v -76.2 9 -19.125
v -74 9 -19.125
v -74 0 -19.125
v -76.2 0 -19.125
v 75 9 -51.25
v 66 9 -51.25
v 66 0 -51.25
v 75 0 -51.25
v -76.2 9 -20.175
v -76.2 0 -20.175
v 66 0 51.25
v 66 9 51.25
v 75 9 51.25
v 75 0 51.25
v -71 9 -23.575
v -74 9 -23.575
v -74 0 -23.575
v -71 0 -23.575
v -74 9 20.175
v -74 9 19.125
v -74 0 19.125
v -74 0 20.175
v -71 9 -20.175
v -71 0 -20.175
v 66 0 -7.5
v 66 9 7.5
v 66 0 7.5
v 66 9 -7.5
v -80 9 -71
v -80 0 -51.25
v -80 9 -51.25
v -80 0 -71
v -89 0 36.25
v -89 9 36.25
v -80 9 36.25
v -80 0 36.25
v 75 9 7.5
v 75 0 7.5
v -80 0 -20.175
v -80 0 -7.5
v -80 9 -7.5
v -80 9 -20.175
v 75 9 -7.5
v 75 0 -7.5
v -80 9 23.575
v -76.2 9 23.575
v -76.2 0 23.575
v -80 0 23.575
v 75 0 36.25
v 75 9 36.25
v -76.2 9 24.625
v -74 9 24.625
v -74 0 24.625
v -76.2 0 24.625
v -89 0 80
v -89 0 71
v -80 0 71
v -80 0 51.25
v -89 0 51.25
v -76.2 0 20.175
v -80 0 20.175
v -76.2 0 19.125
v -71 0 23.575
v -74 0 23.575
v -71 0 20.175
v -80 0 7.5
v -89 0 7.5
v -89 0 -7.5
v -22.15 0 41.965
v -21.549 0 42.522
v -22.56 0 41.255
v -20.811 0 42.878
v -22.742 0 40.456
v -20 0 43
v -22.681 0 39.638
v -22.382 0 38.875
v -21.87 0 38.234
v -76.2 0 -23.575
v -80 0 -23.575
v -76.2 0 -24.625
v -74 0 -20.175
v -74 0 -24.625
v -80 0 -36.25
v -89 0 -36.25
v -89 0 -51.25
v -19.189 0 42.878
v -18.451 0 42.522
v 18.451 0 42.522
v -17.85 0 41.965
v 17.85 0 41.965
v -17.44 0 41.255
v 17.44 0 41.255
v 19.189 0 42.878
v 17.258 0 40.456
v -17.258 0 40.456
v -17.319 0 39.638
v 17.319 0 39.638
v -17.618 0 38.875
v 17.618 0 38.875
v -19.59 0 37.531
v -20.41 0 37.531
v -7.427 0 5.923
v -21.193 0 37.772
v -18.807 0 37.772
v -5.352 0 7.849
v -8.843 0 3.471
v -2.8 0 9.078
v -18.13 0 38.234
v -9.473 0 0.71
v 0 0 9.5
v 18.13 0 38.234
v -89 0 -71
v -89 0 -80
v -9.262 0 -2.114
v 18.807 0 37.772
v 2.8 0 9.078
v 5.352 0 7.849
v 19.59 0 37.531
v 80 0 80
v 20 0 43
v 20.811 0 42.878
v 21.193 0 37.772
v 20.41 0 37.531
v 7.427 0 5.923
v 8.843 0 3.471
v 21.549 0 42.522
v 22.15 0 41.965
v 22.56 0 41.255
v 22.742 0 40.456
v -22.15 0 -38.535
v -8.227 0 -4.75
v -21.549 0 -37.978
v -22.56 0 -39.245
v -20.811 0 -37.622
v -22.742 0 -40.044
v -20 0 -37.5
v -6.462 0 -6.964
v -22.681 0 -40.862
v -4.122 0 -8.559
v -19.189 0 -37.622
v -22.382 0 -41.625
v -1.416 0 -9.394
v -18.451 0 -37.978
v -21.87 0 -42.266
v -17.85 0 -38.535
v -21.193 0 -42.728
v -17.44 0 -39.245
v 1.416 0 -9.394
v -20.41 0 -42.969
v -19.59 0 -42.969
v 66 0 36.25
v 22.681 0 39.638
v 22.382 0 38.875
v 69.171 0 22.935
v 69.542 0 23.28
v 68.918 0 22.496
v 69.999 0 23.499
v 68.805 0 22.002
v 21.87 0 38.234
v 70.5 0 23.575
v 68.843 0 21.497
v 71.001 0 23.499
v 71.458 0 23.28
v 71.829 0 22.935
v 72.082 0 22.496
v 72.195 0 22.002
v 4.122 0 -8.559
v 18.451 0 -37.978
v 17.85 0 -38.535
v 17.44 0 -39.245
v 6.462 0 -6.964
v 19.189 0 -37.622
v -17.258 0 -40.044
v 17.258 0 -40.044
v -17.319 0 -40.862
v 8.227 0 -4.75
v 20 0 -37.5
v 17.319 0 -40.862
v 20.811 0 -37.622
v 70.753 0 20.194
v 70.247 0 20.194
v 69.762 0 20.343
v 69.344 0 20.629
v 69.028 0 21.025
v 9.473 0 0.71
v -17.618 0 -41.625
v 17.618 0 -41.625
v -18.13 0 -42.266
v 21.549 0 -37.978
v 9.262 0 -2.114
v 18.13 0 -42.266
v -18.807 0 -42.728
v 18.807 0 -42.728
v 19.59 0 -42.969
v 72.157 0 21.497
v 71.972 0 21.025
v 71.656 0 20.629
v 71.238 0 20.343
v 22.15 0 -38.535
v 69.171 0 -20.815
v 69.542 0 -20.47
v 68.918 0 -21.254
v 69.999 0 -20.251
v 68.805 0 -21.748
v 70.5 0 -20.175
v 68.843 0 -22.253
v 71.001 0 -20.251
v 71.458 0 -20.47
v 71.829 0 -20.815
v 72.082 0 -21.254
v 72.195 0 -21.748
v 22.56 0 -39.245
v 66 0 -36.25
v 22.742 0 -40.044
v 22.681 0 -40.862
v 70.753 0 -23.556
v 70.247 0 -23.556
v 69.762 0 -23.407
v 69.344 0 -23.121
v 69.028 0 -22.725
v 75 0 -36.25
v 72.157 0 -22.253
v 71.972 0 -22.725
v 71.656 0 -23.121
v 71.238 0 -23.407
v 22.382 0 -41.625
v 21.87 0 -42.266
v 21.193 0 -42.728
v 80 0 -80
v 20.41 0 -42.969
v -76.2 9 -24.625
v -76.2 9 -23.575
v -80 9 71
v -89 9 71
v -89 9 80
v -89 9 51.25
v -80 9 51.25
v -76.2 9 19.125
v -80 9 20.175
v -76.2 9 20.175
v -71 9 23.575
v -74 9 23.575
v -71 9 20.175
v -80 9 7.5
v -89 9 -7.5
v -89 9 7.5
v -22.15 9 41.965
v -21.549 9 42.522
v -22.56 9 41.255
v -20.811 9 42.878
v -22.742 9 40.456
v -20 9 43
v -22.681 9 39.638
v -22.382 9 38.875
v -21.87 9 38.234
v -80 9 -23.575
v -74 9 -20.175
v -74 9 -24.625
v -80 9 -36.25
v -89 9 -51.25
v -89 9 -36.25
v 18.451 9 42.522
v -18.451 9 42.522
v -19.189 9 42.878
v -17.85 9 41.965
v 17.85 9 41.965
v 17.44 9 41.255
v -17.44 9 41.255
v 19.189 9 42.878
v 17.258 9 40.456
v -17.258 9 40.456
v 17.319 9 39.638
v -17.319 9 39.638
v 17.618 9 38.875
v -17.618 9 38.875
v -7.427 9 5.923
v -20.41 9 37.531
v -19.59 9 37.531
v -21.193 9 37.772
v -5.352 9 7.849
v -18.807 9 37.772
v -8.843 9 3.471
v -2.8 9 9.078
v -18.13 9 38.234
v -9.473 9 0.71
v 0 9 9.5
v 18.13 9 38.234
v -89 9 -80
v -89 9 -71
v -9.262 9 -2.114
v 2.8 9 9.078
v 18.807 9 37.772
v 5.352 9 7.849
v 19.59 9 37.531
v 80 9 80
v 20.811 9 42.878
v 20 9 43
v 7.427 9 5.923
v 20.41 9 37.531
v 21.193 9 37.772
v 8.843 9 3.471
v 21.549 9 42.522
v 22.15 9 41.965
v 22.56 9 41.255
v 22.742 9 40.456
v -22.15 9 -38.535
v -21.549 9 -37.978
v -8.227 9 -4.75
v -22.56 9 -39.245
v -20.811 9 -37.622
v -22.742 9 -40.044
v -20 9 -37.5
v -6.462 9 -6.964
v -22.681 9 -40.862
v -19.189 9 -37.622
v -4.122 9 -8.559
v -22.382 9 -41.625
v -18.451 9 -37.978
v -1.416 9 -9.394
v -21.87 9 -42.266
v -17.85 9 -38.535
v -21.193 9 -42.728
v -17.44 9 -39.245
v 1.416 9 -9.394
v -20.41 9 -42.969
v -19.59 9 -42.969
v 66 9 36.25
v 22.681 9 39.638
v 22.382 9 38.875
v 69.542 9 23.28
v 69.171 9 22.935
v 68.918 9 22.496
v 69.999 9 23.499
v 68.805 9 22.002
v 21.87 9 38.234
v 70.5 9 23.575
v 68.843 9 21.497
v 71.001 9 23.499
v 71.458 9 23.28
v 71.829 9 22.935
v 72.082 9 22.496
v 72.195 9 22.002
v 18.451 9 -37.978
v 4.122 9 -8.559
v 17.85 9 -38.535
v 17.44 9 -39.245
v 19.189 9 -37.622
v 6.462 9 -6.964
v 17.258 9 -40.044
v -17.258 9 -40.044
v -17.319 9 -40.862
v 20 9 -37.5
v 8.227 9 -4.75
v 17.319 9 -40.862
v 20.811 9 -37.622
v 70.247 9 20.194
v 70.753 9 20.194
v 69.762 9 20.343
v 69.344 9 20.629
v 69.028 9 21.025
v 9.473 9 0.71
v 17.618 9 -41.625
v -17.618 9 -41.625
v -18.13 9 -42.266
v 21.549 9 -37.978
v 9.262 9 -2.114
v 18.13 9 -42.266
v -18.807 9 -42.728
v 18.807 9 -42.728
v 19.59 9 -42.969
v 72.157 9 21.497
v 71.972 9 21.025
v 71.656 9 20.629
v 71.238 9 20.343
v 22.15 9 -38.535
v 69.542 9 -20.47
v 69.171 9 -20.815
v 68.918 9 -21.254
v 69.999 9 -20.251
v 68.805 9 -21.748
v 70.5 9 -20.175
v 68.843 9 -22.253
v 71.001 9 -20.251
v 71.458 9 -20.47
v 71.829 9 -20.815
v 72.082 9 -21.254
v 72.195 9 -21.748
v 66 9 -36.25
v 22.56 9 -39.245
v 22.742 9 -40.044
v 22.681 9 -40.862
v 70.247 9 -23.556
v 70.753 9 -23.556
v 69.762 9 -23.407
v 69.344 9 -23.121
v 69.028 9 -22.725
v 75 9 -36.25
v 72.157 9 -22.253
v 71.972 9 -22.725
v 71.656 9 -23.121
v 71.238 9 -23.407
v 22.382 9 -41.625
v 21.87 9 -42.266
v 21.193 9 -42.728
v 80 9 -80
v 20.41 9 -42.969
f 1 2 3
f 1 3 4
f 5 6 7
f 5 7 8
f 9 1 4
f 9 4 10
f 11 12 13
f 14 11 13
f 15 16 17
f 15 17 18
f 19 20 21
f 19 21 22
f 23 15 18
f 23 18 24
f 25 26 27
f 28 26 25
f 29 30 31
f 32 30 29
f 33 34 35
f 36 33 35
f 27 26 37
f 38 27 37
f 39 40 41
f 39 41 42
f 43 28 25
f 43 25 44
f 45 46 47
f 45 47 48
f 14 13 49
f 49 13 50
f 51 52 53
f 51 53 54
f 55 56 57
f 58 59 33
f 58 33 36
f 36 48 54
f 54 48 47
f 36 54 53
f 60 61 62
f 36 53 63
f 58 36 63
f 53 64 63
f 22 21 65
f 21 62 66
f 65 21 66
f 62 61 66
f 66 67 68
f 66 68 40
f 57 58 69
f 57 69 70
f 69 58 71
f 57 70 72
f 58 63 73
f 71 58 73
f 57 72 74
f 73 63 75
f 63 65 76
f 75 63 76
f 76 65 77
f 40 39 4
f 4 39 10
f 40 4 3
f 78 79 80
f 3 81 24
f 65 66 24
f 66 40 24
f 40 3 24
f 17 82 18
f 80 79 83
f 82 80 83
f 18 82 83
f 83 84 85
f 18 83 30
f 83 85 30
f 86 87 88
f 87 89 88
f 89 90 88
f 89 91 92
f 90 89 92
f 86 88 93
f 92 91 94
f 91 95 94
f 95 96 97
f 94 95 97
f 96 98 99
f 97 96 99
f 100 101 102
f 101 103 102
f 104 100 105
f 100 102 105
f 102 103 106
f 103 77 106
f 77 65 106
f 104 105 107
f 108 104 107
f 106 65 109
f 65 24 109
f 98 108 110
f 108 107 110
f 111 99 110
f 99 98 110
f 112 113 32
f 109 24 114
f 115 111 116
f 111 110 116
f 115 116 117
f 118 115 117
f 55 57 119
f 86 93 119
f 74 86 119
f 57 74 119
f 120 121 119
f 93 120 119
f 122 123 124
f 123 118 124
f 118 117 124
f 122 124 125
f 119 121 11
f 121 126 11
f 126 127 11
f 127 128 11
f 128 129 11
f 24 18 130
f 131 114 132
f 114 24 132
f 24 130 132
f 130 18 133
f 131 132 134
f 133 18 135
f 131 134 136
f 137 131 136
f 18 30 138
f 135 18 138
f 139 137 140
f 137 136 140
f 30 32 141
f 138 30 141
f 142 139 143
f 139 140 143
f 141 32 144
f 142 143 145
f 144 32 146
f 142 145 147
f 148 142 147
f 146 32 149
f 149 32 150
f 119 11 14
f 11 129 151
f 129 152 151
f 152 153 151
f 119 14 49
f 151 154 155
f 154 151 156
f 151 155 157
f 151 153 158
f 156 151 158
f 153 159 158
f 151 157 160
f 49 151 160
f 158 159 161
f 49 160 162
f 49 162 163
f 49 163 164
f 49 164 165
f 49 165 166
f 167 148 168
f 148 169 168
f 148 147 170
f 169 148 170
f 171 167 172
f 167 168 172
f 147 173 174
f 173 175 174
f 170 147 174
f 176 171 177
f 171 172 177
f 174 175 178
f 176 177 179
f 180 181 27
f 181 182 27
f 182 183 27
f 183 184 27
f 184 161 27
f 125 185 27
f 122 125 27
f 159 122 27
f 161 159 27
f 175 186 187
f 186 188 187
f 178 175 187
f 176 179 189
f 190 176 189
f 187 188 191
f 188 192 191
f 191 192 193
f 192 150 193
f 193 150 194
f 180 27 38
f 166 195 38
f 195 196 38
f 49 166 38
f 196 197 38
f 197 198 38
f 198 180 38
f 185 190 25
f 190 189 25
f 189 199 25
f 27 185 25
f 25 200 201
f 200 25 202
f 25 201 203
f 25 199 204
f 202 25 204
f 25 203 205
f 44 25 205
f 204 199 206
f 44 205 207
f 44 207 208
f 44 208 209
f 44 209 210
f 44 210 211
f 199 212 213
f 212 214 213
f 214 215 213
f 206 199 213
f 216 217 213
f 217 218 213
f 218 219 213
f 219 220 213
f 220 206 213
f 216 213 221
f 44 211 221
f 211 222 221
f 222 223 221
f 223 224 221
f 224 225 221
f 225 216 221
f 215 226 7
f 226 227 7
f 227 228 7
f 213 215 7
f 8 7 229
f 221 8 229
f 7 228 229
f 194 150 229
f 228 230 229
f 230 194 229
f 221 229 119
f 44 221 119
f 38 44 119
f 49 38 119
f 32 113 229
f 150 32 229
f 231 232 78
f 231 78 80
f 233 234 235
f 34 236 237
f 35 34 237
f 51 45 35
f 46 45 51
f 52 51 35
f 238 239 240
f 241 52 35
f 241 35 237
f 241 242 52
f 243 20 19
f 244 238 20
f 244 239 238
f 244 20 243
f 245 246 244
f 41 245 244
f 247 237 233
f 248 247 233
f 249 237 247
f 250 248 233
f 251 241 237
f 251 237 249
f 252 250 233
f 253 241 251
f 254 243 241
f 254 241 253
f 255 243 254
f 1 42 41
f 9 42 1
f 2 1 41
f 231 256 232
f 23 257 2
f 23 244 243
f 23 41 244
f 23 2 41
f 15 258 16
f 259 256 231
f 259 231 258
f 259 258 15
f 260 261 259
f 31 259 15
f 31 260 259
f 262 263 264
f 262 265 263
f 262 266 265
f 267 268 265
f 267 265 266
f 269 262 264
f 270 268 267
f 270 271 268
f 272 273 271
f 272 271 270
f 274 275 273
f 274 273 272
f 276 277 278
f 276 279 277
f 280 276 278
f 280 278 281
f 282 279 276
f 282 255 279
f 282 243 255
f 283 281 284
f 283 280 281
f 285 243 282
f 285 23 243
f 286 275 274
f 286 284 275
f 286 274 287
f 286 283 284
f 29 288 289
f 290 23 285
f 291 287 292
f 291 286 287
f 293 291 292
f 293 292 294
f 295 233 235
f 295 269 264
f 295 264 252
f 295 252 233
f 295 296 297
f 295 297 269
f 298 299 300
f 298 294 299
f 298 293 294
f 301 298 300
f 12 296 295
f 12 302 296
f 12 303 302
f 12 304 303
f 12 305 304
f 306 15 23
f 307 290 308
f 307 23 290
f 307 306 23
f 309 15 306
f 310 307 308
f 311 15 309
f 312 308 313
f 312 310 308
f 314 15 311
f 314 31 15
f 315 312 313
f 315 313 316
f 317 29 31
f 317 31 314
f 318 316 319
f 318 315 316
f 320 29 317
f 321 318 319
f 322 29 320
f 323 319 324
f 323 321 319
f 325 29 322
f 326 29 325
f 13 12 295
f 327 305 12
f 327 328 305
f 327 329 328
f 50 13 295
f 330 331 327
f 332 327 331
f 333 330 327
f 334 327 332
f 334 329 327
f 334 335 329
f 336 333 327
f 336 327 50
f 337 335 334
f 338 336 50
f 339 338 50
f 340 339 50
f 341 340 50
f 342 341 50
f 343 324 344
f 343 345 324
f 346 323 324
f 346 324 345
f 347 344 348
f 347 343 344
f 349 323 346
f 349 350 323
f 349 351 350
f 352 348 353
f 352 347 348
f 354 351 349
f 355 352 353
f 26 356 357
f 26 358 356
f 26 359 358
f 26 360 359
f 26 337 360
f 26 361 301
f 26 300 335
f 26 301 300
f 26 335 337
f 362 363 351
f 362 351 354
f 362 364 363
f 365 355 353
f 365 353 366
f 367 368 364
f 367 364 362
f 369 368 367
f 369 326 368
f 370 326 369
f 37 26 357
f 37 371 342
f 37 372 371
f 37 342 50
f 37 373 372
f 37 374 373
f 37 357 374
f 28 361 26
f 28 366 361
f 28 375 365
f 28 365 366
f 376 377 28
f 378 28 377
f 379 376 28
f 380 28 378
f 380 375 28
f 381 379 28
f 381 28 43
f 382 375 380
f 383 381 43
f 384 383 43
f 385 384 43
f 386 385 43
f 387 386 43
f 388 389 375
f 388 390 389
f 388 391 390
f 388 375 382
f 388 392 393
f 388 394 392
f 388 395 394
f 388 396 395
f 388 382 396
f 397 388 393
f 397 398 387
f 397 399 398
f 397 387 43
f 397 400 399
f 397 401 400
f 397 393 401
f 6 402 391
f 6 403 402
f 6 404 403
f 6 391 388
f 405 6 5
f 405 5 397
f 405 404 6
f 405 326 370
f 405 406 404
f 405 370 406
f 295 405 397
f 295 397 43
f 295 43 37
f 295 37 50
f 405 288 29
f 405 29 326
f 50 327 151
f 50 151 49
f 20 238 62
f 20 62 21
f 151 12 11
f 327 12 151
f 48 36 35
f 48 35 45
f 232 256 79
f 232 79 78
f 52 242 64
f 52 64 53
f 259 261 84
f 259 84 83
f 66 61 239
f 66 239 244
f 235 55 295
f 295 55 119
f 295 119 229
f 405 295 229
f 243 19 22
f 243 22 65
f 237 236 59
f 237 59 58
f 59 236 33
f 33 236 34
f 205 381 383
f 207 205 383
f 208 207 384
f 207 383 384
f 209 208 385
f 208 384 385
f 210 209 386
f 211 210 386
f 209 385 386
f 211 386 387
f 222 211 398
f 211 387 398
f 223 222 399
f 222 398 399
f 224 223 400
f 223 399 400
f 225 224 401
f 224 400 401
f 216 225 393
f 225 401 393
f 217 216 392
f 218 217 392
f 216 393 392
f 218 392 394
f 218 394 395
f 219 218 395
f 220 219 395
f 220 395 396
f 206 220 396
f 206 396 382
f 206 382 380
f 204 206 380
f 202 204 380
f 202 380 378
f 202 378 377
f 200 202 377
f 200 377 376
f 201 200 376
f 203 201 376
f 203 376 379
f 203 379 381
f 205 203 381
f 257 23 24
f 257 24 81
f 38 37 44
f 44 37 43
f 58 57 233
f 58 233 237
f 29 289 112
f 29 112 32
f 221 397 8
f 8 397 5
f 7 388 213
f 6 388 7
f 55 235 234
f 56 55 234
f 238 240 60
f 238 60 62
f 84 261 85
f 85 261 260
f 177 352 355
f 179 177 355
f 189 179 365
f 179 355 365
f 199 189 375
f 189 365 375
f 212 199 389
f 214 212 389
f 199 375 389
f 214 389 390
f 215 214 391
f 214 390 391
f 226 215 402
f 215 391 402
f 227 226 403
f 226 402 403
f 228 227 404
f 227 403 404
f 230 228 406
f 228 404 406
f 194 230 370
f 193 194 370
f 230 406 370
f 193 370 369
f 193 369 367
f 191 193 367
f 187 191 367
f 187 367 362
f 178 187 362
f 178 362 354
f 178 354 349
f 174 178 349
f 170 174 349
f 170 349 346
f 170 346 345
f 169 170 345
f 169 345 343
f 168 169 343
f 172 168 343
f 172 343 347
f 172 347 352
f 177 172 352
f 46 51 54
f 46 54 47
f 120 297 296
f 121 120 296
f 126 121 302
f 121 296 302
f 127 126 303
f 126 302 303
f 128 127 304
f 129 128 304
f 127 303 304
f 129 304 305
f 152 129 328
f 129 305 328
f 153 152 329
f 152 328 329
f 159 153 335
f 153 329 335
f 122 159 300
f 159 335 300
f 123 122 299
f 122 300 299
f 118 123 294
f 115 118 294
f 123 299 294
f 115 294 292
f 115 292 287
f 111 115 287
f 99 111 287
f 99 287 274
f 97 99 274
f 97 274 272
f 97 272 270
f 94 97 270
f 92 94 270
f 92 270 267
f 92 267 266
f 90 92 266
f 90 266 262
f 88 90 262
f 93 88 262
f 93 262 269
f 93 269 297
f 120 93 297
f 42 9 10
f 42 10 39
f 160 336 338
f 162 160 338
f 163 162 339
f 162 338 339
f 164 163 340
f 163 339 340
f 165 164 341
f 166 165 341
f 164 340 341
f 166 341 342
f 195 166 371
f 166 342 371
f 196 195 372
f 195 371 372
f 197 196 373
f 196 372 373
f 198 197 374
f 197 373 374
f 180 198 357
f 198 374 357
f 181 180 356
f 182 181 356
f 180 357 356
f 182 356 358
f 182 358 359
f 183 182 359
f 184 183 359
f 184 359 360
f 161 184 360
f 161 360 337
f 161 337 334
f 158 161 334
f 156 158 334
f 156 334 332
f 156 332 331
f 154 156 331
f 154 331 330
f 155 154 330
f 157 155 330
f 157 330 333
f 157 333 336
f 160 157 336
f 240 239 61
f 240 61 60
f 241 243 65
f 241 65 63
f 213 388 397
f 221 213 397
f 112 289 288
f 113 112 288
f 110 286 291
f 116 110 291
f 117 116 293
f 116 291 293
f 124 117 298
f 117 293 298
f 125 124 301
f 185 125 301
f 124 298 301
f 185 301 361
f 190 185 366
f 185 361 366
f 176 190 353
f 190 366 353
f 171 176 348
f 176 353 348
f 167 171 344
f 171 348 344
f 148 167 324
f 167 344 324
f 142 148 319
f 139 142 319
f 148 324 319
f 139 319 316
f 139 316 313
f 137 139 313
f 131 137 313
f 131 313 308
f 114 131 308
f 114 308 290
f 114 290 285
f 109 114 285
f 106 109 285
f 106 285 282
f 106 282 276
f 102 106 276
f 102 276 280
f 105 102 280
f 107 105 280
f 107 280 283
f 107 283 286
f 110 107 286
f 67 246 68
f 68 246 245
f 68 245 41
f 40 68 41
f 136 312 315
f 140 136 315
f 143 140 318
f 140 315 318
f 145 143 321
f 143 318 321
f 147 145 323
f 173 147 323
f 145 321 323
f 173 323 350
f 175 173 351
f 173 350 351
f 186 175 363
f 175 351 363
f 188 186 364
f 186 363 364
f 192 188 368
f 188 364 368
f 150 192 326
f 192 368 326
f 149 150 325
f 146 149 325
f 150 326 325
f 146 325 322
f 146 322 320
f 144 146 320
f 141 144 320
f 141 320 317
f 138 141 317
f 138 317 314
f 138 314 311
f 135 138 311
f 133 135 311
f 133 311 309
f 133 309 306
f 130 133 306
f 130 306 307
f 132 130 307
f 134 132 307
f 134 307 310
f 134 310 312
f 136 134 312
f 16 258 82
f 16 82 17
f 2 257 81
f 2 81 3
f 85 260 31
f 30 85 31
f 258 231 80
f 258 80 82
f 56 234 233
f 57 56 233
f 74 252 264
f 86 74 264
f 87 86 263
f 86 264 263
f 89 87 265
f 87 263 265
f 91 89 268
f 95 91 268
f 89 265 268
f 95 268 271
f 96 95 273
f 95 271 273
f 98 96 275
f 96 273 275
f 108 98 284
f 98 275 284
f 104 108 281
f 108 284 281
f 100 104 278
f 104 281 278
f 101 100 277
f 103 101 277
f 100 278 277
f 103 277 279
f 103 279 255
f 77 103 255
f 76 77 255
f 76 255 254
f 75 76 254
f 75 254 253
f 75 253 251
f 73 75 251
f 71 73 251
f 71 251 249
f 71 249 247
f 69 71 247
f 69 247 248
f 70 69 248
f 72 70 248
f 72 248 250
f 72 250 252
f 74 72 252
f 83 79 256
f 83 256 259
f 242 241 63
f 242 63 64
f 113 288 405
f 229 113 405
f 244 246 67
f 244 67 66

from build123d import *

# Parameters (mm, degrees)
SKETCH1_W           = 160
SKETCH1_H           = 160
BOSS_EXTRUDE1_DEPTH = 9
SKETCH2_W           = 9
SKETCH2_H           = 15
SKETCH2_H_2         = 9
BOSS_EXTRUDE2_DEPTH = 9
SKETCH3_R           = 1.7
SKETCH3_W           = 9
SKETCH3_H           = 15
CUT_EXTRUDE1_DEPTH  = 121.008333044
CUT_EXTRUDE2_DEPTH  = 121.008333044
SKETCH5_R           = 9.5
SKETCH5_R_2         = 2.75
CUT_EXTRUDE3_DEPTH  = 121.008333044


with BuildPart() as part:
    # Sketch1 → Boss-Extrude1 (new body)
    with BuildSketch(Plane(origin=(0, 0, 0), x_dir=(1, 0, 0), z_dir=(0, 1, 0))):
        Rectangle(SKETCH1_W, SKETCH1_H)
    extrude(amount=BOSS_EXTRUDE1_DEPTH)

    # Sketch2 → Boss-Extrude2 (add)
    with BuildSketch(Plane(origin=(0, 9, 0), x_dir=(1, 0, 0), z_dir=(0, 1, 0))):
        with Locations((-84.5, 0)):
            Rectangle(SKETCH2_W, SKETCH2_H)
        with Locations((-84.5, 43.75)):
            Rectangle(SKETCH2_W, SKETCH2_H)
        with Locations((-84.5, -43.75)):
            Rectangle(SKETCH2_W, SKETCH2_H)
        with Locations((-84.5, 75.5)):
            Rectangle(SKETCH2_W, SKETCH2_H_2)
        with Locations((-84.5, -75.5)):
            Rectangle(SKETCH2_W, SKETCH2_H_2)
    extrude(amount=-BOSS_EXTRUDE2_DEPTH)

    # Sketch3 → Cut-Extrude1 (cut, through all)
    with BuildSketch(Plane(origin=(0, 9, 0), x_dir=(1, 0, 0), z_dir=(0, 1, 0))):
        with Locations(Location((70.5, 21.875, 0), (0, 0, 270))):
            Circle(SKETCH3_R)
        with Locations(Location((70.5, -21.875, 0), (0, 0, 270))):
            Circle(SKETCH3_R)
        with Locations((70.5, 43.75)):
            Rectangle(SKETCH3_W, SKETCH3_H)
        with Locations((70.5, 0)):
            Rectangle(SKETCH3_W, SKETCH3_H)
        with Locations((70.5, -43.75)):
            Rectangle(SKETCH3_W, SKETCH3_H)
    extrude(amount=-CUT_EXTRUDE1_DEPTH, mode=Mode.SUBTRACT)

    # Sketch4 → Cut-Extrude2 (cut, through all)
    with BuildSketch(Plane(origin=(0, 9, 0), x_dir=(1, 0, 0), z_dir=(0, 1, 0))):
        Polygon((-80, 23.575), (-76.2, 23.575), (-76.2, 24.625), (-74, 24.625), (-74, 23.575), (-71, 23.575), (-71, 20.175), (-74, 20.175), (-74, 19.125), (-76.2, 19.125), (-76.2, 20.175), (-80, 20.175), align=None)
        Polygon((-80, -23.575), (-80, -20.175), (-76.2, -20.175), (-76.2, -19.125), (-74, -19.125), (-74, -20.175), (-71, -20.175), (-71, -23.575), (-74, -23.575), (-74, -24.625), (-76.2, -24.625), (-76.2, -23.575), align=None)
    extrude(amount=-CUT_EXTRUDE2_DEPTH, mode=Mode.SUBTRACT)

    # Sketch5 → Cut-Extrude3 (cut, through all)
    with BuildSketch(Plane(origin=(0, 9, 0), x_dir=(1, 0, 0), z_dir=(0, 1, 0))):
        with Locations(Location((0, 0, 0), (0, 0, 270))):
            Circle(SKETCH5_R)
        with Locations(Location((-20, 40.25, 0), (0, 0, 270))):
            Circle(SKETCH5_R_2)
        with Locations(Location((20, 40.25, 0), (0, 0, 270))):
            Circle(SKETCH5_R_2)
        with Locations(Location((20, -40.25, 0), (0, 0, 270))):
            Circle(SKETCH5_R_2)
        with Locations(Location((-20, -40.25, 0), (0, 0, 270))):
            Circle(SKETCH5_R_2)
    extrude(amount=-CUT_EXTRUDE3_DEPTH, mode=Mode.SUBTRACT)


solid = part.part
